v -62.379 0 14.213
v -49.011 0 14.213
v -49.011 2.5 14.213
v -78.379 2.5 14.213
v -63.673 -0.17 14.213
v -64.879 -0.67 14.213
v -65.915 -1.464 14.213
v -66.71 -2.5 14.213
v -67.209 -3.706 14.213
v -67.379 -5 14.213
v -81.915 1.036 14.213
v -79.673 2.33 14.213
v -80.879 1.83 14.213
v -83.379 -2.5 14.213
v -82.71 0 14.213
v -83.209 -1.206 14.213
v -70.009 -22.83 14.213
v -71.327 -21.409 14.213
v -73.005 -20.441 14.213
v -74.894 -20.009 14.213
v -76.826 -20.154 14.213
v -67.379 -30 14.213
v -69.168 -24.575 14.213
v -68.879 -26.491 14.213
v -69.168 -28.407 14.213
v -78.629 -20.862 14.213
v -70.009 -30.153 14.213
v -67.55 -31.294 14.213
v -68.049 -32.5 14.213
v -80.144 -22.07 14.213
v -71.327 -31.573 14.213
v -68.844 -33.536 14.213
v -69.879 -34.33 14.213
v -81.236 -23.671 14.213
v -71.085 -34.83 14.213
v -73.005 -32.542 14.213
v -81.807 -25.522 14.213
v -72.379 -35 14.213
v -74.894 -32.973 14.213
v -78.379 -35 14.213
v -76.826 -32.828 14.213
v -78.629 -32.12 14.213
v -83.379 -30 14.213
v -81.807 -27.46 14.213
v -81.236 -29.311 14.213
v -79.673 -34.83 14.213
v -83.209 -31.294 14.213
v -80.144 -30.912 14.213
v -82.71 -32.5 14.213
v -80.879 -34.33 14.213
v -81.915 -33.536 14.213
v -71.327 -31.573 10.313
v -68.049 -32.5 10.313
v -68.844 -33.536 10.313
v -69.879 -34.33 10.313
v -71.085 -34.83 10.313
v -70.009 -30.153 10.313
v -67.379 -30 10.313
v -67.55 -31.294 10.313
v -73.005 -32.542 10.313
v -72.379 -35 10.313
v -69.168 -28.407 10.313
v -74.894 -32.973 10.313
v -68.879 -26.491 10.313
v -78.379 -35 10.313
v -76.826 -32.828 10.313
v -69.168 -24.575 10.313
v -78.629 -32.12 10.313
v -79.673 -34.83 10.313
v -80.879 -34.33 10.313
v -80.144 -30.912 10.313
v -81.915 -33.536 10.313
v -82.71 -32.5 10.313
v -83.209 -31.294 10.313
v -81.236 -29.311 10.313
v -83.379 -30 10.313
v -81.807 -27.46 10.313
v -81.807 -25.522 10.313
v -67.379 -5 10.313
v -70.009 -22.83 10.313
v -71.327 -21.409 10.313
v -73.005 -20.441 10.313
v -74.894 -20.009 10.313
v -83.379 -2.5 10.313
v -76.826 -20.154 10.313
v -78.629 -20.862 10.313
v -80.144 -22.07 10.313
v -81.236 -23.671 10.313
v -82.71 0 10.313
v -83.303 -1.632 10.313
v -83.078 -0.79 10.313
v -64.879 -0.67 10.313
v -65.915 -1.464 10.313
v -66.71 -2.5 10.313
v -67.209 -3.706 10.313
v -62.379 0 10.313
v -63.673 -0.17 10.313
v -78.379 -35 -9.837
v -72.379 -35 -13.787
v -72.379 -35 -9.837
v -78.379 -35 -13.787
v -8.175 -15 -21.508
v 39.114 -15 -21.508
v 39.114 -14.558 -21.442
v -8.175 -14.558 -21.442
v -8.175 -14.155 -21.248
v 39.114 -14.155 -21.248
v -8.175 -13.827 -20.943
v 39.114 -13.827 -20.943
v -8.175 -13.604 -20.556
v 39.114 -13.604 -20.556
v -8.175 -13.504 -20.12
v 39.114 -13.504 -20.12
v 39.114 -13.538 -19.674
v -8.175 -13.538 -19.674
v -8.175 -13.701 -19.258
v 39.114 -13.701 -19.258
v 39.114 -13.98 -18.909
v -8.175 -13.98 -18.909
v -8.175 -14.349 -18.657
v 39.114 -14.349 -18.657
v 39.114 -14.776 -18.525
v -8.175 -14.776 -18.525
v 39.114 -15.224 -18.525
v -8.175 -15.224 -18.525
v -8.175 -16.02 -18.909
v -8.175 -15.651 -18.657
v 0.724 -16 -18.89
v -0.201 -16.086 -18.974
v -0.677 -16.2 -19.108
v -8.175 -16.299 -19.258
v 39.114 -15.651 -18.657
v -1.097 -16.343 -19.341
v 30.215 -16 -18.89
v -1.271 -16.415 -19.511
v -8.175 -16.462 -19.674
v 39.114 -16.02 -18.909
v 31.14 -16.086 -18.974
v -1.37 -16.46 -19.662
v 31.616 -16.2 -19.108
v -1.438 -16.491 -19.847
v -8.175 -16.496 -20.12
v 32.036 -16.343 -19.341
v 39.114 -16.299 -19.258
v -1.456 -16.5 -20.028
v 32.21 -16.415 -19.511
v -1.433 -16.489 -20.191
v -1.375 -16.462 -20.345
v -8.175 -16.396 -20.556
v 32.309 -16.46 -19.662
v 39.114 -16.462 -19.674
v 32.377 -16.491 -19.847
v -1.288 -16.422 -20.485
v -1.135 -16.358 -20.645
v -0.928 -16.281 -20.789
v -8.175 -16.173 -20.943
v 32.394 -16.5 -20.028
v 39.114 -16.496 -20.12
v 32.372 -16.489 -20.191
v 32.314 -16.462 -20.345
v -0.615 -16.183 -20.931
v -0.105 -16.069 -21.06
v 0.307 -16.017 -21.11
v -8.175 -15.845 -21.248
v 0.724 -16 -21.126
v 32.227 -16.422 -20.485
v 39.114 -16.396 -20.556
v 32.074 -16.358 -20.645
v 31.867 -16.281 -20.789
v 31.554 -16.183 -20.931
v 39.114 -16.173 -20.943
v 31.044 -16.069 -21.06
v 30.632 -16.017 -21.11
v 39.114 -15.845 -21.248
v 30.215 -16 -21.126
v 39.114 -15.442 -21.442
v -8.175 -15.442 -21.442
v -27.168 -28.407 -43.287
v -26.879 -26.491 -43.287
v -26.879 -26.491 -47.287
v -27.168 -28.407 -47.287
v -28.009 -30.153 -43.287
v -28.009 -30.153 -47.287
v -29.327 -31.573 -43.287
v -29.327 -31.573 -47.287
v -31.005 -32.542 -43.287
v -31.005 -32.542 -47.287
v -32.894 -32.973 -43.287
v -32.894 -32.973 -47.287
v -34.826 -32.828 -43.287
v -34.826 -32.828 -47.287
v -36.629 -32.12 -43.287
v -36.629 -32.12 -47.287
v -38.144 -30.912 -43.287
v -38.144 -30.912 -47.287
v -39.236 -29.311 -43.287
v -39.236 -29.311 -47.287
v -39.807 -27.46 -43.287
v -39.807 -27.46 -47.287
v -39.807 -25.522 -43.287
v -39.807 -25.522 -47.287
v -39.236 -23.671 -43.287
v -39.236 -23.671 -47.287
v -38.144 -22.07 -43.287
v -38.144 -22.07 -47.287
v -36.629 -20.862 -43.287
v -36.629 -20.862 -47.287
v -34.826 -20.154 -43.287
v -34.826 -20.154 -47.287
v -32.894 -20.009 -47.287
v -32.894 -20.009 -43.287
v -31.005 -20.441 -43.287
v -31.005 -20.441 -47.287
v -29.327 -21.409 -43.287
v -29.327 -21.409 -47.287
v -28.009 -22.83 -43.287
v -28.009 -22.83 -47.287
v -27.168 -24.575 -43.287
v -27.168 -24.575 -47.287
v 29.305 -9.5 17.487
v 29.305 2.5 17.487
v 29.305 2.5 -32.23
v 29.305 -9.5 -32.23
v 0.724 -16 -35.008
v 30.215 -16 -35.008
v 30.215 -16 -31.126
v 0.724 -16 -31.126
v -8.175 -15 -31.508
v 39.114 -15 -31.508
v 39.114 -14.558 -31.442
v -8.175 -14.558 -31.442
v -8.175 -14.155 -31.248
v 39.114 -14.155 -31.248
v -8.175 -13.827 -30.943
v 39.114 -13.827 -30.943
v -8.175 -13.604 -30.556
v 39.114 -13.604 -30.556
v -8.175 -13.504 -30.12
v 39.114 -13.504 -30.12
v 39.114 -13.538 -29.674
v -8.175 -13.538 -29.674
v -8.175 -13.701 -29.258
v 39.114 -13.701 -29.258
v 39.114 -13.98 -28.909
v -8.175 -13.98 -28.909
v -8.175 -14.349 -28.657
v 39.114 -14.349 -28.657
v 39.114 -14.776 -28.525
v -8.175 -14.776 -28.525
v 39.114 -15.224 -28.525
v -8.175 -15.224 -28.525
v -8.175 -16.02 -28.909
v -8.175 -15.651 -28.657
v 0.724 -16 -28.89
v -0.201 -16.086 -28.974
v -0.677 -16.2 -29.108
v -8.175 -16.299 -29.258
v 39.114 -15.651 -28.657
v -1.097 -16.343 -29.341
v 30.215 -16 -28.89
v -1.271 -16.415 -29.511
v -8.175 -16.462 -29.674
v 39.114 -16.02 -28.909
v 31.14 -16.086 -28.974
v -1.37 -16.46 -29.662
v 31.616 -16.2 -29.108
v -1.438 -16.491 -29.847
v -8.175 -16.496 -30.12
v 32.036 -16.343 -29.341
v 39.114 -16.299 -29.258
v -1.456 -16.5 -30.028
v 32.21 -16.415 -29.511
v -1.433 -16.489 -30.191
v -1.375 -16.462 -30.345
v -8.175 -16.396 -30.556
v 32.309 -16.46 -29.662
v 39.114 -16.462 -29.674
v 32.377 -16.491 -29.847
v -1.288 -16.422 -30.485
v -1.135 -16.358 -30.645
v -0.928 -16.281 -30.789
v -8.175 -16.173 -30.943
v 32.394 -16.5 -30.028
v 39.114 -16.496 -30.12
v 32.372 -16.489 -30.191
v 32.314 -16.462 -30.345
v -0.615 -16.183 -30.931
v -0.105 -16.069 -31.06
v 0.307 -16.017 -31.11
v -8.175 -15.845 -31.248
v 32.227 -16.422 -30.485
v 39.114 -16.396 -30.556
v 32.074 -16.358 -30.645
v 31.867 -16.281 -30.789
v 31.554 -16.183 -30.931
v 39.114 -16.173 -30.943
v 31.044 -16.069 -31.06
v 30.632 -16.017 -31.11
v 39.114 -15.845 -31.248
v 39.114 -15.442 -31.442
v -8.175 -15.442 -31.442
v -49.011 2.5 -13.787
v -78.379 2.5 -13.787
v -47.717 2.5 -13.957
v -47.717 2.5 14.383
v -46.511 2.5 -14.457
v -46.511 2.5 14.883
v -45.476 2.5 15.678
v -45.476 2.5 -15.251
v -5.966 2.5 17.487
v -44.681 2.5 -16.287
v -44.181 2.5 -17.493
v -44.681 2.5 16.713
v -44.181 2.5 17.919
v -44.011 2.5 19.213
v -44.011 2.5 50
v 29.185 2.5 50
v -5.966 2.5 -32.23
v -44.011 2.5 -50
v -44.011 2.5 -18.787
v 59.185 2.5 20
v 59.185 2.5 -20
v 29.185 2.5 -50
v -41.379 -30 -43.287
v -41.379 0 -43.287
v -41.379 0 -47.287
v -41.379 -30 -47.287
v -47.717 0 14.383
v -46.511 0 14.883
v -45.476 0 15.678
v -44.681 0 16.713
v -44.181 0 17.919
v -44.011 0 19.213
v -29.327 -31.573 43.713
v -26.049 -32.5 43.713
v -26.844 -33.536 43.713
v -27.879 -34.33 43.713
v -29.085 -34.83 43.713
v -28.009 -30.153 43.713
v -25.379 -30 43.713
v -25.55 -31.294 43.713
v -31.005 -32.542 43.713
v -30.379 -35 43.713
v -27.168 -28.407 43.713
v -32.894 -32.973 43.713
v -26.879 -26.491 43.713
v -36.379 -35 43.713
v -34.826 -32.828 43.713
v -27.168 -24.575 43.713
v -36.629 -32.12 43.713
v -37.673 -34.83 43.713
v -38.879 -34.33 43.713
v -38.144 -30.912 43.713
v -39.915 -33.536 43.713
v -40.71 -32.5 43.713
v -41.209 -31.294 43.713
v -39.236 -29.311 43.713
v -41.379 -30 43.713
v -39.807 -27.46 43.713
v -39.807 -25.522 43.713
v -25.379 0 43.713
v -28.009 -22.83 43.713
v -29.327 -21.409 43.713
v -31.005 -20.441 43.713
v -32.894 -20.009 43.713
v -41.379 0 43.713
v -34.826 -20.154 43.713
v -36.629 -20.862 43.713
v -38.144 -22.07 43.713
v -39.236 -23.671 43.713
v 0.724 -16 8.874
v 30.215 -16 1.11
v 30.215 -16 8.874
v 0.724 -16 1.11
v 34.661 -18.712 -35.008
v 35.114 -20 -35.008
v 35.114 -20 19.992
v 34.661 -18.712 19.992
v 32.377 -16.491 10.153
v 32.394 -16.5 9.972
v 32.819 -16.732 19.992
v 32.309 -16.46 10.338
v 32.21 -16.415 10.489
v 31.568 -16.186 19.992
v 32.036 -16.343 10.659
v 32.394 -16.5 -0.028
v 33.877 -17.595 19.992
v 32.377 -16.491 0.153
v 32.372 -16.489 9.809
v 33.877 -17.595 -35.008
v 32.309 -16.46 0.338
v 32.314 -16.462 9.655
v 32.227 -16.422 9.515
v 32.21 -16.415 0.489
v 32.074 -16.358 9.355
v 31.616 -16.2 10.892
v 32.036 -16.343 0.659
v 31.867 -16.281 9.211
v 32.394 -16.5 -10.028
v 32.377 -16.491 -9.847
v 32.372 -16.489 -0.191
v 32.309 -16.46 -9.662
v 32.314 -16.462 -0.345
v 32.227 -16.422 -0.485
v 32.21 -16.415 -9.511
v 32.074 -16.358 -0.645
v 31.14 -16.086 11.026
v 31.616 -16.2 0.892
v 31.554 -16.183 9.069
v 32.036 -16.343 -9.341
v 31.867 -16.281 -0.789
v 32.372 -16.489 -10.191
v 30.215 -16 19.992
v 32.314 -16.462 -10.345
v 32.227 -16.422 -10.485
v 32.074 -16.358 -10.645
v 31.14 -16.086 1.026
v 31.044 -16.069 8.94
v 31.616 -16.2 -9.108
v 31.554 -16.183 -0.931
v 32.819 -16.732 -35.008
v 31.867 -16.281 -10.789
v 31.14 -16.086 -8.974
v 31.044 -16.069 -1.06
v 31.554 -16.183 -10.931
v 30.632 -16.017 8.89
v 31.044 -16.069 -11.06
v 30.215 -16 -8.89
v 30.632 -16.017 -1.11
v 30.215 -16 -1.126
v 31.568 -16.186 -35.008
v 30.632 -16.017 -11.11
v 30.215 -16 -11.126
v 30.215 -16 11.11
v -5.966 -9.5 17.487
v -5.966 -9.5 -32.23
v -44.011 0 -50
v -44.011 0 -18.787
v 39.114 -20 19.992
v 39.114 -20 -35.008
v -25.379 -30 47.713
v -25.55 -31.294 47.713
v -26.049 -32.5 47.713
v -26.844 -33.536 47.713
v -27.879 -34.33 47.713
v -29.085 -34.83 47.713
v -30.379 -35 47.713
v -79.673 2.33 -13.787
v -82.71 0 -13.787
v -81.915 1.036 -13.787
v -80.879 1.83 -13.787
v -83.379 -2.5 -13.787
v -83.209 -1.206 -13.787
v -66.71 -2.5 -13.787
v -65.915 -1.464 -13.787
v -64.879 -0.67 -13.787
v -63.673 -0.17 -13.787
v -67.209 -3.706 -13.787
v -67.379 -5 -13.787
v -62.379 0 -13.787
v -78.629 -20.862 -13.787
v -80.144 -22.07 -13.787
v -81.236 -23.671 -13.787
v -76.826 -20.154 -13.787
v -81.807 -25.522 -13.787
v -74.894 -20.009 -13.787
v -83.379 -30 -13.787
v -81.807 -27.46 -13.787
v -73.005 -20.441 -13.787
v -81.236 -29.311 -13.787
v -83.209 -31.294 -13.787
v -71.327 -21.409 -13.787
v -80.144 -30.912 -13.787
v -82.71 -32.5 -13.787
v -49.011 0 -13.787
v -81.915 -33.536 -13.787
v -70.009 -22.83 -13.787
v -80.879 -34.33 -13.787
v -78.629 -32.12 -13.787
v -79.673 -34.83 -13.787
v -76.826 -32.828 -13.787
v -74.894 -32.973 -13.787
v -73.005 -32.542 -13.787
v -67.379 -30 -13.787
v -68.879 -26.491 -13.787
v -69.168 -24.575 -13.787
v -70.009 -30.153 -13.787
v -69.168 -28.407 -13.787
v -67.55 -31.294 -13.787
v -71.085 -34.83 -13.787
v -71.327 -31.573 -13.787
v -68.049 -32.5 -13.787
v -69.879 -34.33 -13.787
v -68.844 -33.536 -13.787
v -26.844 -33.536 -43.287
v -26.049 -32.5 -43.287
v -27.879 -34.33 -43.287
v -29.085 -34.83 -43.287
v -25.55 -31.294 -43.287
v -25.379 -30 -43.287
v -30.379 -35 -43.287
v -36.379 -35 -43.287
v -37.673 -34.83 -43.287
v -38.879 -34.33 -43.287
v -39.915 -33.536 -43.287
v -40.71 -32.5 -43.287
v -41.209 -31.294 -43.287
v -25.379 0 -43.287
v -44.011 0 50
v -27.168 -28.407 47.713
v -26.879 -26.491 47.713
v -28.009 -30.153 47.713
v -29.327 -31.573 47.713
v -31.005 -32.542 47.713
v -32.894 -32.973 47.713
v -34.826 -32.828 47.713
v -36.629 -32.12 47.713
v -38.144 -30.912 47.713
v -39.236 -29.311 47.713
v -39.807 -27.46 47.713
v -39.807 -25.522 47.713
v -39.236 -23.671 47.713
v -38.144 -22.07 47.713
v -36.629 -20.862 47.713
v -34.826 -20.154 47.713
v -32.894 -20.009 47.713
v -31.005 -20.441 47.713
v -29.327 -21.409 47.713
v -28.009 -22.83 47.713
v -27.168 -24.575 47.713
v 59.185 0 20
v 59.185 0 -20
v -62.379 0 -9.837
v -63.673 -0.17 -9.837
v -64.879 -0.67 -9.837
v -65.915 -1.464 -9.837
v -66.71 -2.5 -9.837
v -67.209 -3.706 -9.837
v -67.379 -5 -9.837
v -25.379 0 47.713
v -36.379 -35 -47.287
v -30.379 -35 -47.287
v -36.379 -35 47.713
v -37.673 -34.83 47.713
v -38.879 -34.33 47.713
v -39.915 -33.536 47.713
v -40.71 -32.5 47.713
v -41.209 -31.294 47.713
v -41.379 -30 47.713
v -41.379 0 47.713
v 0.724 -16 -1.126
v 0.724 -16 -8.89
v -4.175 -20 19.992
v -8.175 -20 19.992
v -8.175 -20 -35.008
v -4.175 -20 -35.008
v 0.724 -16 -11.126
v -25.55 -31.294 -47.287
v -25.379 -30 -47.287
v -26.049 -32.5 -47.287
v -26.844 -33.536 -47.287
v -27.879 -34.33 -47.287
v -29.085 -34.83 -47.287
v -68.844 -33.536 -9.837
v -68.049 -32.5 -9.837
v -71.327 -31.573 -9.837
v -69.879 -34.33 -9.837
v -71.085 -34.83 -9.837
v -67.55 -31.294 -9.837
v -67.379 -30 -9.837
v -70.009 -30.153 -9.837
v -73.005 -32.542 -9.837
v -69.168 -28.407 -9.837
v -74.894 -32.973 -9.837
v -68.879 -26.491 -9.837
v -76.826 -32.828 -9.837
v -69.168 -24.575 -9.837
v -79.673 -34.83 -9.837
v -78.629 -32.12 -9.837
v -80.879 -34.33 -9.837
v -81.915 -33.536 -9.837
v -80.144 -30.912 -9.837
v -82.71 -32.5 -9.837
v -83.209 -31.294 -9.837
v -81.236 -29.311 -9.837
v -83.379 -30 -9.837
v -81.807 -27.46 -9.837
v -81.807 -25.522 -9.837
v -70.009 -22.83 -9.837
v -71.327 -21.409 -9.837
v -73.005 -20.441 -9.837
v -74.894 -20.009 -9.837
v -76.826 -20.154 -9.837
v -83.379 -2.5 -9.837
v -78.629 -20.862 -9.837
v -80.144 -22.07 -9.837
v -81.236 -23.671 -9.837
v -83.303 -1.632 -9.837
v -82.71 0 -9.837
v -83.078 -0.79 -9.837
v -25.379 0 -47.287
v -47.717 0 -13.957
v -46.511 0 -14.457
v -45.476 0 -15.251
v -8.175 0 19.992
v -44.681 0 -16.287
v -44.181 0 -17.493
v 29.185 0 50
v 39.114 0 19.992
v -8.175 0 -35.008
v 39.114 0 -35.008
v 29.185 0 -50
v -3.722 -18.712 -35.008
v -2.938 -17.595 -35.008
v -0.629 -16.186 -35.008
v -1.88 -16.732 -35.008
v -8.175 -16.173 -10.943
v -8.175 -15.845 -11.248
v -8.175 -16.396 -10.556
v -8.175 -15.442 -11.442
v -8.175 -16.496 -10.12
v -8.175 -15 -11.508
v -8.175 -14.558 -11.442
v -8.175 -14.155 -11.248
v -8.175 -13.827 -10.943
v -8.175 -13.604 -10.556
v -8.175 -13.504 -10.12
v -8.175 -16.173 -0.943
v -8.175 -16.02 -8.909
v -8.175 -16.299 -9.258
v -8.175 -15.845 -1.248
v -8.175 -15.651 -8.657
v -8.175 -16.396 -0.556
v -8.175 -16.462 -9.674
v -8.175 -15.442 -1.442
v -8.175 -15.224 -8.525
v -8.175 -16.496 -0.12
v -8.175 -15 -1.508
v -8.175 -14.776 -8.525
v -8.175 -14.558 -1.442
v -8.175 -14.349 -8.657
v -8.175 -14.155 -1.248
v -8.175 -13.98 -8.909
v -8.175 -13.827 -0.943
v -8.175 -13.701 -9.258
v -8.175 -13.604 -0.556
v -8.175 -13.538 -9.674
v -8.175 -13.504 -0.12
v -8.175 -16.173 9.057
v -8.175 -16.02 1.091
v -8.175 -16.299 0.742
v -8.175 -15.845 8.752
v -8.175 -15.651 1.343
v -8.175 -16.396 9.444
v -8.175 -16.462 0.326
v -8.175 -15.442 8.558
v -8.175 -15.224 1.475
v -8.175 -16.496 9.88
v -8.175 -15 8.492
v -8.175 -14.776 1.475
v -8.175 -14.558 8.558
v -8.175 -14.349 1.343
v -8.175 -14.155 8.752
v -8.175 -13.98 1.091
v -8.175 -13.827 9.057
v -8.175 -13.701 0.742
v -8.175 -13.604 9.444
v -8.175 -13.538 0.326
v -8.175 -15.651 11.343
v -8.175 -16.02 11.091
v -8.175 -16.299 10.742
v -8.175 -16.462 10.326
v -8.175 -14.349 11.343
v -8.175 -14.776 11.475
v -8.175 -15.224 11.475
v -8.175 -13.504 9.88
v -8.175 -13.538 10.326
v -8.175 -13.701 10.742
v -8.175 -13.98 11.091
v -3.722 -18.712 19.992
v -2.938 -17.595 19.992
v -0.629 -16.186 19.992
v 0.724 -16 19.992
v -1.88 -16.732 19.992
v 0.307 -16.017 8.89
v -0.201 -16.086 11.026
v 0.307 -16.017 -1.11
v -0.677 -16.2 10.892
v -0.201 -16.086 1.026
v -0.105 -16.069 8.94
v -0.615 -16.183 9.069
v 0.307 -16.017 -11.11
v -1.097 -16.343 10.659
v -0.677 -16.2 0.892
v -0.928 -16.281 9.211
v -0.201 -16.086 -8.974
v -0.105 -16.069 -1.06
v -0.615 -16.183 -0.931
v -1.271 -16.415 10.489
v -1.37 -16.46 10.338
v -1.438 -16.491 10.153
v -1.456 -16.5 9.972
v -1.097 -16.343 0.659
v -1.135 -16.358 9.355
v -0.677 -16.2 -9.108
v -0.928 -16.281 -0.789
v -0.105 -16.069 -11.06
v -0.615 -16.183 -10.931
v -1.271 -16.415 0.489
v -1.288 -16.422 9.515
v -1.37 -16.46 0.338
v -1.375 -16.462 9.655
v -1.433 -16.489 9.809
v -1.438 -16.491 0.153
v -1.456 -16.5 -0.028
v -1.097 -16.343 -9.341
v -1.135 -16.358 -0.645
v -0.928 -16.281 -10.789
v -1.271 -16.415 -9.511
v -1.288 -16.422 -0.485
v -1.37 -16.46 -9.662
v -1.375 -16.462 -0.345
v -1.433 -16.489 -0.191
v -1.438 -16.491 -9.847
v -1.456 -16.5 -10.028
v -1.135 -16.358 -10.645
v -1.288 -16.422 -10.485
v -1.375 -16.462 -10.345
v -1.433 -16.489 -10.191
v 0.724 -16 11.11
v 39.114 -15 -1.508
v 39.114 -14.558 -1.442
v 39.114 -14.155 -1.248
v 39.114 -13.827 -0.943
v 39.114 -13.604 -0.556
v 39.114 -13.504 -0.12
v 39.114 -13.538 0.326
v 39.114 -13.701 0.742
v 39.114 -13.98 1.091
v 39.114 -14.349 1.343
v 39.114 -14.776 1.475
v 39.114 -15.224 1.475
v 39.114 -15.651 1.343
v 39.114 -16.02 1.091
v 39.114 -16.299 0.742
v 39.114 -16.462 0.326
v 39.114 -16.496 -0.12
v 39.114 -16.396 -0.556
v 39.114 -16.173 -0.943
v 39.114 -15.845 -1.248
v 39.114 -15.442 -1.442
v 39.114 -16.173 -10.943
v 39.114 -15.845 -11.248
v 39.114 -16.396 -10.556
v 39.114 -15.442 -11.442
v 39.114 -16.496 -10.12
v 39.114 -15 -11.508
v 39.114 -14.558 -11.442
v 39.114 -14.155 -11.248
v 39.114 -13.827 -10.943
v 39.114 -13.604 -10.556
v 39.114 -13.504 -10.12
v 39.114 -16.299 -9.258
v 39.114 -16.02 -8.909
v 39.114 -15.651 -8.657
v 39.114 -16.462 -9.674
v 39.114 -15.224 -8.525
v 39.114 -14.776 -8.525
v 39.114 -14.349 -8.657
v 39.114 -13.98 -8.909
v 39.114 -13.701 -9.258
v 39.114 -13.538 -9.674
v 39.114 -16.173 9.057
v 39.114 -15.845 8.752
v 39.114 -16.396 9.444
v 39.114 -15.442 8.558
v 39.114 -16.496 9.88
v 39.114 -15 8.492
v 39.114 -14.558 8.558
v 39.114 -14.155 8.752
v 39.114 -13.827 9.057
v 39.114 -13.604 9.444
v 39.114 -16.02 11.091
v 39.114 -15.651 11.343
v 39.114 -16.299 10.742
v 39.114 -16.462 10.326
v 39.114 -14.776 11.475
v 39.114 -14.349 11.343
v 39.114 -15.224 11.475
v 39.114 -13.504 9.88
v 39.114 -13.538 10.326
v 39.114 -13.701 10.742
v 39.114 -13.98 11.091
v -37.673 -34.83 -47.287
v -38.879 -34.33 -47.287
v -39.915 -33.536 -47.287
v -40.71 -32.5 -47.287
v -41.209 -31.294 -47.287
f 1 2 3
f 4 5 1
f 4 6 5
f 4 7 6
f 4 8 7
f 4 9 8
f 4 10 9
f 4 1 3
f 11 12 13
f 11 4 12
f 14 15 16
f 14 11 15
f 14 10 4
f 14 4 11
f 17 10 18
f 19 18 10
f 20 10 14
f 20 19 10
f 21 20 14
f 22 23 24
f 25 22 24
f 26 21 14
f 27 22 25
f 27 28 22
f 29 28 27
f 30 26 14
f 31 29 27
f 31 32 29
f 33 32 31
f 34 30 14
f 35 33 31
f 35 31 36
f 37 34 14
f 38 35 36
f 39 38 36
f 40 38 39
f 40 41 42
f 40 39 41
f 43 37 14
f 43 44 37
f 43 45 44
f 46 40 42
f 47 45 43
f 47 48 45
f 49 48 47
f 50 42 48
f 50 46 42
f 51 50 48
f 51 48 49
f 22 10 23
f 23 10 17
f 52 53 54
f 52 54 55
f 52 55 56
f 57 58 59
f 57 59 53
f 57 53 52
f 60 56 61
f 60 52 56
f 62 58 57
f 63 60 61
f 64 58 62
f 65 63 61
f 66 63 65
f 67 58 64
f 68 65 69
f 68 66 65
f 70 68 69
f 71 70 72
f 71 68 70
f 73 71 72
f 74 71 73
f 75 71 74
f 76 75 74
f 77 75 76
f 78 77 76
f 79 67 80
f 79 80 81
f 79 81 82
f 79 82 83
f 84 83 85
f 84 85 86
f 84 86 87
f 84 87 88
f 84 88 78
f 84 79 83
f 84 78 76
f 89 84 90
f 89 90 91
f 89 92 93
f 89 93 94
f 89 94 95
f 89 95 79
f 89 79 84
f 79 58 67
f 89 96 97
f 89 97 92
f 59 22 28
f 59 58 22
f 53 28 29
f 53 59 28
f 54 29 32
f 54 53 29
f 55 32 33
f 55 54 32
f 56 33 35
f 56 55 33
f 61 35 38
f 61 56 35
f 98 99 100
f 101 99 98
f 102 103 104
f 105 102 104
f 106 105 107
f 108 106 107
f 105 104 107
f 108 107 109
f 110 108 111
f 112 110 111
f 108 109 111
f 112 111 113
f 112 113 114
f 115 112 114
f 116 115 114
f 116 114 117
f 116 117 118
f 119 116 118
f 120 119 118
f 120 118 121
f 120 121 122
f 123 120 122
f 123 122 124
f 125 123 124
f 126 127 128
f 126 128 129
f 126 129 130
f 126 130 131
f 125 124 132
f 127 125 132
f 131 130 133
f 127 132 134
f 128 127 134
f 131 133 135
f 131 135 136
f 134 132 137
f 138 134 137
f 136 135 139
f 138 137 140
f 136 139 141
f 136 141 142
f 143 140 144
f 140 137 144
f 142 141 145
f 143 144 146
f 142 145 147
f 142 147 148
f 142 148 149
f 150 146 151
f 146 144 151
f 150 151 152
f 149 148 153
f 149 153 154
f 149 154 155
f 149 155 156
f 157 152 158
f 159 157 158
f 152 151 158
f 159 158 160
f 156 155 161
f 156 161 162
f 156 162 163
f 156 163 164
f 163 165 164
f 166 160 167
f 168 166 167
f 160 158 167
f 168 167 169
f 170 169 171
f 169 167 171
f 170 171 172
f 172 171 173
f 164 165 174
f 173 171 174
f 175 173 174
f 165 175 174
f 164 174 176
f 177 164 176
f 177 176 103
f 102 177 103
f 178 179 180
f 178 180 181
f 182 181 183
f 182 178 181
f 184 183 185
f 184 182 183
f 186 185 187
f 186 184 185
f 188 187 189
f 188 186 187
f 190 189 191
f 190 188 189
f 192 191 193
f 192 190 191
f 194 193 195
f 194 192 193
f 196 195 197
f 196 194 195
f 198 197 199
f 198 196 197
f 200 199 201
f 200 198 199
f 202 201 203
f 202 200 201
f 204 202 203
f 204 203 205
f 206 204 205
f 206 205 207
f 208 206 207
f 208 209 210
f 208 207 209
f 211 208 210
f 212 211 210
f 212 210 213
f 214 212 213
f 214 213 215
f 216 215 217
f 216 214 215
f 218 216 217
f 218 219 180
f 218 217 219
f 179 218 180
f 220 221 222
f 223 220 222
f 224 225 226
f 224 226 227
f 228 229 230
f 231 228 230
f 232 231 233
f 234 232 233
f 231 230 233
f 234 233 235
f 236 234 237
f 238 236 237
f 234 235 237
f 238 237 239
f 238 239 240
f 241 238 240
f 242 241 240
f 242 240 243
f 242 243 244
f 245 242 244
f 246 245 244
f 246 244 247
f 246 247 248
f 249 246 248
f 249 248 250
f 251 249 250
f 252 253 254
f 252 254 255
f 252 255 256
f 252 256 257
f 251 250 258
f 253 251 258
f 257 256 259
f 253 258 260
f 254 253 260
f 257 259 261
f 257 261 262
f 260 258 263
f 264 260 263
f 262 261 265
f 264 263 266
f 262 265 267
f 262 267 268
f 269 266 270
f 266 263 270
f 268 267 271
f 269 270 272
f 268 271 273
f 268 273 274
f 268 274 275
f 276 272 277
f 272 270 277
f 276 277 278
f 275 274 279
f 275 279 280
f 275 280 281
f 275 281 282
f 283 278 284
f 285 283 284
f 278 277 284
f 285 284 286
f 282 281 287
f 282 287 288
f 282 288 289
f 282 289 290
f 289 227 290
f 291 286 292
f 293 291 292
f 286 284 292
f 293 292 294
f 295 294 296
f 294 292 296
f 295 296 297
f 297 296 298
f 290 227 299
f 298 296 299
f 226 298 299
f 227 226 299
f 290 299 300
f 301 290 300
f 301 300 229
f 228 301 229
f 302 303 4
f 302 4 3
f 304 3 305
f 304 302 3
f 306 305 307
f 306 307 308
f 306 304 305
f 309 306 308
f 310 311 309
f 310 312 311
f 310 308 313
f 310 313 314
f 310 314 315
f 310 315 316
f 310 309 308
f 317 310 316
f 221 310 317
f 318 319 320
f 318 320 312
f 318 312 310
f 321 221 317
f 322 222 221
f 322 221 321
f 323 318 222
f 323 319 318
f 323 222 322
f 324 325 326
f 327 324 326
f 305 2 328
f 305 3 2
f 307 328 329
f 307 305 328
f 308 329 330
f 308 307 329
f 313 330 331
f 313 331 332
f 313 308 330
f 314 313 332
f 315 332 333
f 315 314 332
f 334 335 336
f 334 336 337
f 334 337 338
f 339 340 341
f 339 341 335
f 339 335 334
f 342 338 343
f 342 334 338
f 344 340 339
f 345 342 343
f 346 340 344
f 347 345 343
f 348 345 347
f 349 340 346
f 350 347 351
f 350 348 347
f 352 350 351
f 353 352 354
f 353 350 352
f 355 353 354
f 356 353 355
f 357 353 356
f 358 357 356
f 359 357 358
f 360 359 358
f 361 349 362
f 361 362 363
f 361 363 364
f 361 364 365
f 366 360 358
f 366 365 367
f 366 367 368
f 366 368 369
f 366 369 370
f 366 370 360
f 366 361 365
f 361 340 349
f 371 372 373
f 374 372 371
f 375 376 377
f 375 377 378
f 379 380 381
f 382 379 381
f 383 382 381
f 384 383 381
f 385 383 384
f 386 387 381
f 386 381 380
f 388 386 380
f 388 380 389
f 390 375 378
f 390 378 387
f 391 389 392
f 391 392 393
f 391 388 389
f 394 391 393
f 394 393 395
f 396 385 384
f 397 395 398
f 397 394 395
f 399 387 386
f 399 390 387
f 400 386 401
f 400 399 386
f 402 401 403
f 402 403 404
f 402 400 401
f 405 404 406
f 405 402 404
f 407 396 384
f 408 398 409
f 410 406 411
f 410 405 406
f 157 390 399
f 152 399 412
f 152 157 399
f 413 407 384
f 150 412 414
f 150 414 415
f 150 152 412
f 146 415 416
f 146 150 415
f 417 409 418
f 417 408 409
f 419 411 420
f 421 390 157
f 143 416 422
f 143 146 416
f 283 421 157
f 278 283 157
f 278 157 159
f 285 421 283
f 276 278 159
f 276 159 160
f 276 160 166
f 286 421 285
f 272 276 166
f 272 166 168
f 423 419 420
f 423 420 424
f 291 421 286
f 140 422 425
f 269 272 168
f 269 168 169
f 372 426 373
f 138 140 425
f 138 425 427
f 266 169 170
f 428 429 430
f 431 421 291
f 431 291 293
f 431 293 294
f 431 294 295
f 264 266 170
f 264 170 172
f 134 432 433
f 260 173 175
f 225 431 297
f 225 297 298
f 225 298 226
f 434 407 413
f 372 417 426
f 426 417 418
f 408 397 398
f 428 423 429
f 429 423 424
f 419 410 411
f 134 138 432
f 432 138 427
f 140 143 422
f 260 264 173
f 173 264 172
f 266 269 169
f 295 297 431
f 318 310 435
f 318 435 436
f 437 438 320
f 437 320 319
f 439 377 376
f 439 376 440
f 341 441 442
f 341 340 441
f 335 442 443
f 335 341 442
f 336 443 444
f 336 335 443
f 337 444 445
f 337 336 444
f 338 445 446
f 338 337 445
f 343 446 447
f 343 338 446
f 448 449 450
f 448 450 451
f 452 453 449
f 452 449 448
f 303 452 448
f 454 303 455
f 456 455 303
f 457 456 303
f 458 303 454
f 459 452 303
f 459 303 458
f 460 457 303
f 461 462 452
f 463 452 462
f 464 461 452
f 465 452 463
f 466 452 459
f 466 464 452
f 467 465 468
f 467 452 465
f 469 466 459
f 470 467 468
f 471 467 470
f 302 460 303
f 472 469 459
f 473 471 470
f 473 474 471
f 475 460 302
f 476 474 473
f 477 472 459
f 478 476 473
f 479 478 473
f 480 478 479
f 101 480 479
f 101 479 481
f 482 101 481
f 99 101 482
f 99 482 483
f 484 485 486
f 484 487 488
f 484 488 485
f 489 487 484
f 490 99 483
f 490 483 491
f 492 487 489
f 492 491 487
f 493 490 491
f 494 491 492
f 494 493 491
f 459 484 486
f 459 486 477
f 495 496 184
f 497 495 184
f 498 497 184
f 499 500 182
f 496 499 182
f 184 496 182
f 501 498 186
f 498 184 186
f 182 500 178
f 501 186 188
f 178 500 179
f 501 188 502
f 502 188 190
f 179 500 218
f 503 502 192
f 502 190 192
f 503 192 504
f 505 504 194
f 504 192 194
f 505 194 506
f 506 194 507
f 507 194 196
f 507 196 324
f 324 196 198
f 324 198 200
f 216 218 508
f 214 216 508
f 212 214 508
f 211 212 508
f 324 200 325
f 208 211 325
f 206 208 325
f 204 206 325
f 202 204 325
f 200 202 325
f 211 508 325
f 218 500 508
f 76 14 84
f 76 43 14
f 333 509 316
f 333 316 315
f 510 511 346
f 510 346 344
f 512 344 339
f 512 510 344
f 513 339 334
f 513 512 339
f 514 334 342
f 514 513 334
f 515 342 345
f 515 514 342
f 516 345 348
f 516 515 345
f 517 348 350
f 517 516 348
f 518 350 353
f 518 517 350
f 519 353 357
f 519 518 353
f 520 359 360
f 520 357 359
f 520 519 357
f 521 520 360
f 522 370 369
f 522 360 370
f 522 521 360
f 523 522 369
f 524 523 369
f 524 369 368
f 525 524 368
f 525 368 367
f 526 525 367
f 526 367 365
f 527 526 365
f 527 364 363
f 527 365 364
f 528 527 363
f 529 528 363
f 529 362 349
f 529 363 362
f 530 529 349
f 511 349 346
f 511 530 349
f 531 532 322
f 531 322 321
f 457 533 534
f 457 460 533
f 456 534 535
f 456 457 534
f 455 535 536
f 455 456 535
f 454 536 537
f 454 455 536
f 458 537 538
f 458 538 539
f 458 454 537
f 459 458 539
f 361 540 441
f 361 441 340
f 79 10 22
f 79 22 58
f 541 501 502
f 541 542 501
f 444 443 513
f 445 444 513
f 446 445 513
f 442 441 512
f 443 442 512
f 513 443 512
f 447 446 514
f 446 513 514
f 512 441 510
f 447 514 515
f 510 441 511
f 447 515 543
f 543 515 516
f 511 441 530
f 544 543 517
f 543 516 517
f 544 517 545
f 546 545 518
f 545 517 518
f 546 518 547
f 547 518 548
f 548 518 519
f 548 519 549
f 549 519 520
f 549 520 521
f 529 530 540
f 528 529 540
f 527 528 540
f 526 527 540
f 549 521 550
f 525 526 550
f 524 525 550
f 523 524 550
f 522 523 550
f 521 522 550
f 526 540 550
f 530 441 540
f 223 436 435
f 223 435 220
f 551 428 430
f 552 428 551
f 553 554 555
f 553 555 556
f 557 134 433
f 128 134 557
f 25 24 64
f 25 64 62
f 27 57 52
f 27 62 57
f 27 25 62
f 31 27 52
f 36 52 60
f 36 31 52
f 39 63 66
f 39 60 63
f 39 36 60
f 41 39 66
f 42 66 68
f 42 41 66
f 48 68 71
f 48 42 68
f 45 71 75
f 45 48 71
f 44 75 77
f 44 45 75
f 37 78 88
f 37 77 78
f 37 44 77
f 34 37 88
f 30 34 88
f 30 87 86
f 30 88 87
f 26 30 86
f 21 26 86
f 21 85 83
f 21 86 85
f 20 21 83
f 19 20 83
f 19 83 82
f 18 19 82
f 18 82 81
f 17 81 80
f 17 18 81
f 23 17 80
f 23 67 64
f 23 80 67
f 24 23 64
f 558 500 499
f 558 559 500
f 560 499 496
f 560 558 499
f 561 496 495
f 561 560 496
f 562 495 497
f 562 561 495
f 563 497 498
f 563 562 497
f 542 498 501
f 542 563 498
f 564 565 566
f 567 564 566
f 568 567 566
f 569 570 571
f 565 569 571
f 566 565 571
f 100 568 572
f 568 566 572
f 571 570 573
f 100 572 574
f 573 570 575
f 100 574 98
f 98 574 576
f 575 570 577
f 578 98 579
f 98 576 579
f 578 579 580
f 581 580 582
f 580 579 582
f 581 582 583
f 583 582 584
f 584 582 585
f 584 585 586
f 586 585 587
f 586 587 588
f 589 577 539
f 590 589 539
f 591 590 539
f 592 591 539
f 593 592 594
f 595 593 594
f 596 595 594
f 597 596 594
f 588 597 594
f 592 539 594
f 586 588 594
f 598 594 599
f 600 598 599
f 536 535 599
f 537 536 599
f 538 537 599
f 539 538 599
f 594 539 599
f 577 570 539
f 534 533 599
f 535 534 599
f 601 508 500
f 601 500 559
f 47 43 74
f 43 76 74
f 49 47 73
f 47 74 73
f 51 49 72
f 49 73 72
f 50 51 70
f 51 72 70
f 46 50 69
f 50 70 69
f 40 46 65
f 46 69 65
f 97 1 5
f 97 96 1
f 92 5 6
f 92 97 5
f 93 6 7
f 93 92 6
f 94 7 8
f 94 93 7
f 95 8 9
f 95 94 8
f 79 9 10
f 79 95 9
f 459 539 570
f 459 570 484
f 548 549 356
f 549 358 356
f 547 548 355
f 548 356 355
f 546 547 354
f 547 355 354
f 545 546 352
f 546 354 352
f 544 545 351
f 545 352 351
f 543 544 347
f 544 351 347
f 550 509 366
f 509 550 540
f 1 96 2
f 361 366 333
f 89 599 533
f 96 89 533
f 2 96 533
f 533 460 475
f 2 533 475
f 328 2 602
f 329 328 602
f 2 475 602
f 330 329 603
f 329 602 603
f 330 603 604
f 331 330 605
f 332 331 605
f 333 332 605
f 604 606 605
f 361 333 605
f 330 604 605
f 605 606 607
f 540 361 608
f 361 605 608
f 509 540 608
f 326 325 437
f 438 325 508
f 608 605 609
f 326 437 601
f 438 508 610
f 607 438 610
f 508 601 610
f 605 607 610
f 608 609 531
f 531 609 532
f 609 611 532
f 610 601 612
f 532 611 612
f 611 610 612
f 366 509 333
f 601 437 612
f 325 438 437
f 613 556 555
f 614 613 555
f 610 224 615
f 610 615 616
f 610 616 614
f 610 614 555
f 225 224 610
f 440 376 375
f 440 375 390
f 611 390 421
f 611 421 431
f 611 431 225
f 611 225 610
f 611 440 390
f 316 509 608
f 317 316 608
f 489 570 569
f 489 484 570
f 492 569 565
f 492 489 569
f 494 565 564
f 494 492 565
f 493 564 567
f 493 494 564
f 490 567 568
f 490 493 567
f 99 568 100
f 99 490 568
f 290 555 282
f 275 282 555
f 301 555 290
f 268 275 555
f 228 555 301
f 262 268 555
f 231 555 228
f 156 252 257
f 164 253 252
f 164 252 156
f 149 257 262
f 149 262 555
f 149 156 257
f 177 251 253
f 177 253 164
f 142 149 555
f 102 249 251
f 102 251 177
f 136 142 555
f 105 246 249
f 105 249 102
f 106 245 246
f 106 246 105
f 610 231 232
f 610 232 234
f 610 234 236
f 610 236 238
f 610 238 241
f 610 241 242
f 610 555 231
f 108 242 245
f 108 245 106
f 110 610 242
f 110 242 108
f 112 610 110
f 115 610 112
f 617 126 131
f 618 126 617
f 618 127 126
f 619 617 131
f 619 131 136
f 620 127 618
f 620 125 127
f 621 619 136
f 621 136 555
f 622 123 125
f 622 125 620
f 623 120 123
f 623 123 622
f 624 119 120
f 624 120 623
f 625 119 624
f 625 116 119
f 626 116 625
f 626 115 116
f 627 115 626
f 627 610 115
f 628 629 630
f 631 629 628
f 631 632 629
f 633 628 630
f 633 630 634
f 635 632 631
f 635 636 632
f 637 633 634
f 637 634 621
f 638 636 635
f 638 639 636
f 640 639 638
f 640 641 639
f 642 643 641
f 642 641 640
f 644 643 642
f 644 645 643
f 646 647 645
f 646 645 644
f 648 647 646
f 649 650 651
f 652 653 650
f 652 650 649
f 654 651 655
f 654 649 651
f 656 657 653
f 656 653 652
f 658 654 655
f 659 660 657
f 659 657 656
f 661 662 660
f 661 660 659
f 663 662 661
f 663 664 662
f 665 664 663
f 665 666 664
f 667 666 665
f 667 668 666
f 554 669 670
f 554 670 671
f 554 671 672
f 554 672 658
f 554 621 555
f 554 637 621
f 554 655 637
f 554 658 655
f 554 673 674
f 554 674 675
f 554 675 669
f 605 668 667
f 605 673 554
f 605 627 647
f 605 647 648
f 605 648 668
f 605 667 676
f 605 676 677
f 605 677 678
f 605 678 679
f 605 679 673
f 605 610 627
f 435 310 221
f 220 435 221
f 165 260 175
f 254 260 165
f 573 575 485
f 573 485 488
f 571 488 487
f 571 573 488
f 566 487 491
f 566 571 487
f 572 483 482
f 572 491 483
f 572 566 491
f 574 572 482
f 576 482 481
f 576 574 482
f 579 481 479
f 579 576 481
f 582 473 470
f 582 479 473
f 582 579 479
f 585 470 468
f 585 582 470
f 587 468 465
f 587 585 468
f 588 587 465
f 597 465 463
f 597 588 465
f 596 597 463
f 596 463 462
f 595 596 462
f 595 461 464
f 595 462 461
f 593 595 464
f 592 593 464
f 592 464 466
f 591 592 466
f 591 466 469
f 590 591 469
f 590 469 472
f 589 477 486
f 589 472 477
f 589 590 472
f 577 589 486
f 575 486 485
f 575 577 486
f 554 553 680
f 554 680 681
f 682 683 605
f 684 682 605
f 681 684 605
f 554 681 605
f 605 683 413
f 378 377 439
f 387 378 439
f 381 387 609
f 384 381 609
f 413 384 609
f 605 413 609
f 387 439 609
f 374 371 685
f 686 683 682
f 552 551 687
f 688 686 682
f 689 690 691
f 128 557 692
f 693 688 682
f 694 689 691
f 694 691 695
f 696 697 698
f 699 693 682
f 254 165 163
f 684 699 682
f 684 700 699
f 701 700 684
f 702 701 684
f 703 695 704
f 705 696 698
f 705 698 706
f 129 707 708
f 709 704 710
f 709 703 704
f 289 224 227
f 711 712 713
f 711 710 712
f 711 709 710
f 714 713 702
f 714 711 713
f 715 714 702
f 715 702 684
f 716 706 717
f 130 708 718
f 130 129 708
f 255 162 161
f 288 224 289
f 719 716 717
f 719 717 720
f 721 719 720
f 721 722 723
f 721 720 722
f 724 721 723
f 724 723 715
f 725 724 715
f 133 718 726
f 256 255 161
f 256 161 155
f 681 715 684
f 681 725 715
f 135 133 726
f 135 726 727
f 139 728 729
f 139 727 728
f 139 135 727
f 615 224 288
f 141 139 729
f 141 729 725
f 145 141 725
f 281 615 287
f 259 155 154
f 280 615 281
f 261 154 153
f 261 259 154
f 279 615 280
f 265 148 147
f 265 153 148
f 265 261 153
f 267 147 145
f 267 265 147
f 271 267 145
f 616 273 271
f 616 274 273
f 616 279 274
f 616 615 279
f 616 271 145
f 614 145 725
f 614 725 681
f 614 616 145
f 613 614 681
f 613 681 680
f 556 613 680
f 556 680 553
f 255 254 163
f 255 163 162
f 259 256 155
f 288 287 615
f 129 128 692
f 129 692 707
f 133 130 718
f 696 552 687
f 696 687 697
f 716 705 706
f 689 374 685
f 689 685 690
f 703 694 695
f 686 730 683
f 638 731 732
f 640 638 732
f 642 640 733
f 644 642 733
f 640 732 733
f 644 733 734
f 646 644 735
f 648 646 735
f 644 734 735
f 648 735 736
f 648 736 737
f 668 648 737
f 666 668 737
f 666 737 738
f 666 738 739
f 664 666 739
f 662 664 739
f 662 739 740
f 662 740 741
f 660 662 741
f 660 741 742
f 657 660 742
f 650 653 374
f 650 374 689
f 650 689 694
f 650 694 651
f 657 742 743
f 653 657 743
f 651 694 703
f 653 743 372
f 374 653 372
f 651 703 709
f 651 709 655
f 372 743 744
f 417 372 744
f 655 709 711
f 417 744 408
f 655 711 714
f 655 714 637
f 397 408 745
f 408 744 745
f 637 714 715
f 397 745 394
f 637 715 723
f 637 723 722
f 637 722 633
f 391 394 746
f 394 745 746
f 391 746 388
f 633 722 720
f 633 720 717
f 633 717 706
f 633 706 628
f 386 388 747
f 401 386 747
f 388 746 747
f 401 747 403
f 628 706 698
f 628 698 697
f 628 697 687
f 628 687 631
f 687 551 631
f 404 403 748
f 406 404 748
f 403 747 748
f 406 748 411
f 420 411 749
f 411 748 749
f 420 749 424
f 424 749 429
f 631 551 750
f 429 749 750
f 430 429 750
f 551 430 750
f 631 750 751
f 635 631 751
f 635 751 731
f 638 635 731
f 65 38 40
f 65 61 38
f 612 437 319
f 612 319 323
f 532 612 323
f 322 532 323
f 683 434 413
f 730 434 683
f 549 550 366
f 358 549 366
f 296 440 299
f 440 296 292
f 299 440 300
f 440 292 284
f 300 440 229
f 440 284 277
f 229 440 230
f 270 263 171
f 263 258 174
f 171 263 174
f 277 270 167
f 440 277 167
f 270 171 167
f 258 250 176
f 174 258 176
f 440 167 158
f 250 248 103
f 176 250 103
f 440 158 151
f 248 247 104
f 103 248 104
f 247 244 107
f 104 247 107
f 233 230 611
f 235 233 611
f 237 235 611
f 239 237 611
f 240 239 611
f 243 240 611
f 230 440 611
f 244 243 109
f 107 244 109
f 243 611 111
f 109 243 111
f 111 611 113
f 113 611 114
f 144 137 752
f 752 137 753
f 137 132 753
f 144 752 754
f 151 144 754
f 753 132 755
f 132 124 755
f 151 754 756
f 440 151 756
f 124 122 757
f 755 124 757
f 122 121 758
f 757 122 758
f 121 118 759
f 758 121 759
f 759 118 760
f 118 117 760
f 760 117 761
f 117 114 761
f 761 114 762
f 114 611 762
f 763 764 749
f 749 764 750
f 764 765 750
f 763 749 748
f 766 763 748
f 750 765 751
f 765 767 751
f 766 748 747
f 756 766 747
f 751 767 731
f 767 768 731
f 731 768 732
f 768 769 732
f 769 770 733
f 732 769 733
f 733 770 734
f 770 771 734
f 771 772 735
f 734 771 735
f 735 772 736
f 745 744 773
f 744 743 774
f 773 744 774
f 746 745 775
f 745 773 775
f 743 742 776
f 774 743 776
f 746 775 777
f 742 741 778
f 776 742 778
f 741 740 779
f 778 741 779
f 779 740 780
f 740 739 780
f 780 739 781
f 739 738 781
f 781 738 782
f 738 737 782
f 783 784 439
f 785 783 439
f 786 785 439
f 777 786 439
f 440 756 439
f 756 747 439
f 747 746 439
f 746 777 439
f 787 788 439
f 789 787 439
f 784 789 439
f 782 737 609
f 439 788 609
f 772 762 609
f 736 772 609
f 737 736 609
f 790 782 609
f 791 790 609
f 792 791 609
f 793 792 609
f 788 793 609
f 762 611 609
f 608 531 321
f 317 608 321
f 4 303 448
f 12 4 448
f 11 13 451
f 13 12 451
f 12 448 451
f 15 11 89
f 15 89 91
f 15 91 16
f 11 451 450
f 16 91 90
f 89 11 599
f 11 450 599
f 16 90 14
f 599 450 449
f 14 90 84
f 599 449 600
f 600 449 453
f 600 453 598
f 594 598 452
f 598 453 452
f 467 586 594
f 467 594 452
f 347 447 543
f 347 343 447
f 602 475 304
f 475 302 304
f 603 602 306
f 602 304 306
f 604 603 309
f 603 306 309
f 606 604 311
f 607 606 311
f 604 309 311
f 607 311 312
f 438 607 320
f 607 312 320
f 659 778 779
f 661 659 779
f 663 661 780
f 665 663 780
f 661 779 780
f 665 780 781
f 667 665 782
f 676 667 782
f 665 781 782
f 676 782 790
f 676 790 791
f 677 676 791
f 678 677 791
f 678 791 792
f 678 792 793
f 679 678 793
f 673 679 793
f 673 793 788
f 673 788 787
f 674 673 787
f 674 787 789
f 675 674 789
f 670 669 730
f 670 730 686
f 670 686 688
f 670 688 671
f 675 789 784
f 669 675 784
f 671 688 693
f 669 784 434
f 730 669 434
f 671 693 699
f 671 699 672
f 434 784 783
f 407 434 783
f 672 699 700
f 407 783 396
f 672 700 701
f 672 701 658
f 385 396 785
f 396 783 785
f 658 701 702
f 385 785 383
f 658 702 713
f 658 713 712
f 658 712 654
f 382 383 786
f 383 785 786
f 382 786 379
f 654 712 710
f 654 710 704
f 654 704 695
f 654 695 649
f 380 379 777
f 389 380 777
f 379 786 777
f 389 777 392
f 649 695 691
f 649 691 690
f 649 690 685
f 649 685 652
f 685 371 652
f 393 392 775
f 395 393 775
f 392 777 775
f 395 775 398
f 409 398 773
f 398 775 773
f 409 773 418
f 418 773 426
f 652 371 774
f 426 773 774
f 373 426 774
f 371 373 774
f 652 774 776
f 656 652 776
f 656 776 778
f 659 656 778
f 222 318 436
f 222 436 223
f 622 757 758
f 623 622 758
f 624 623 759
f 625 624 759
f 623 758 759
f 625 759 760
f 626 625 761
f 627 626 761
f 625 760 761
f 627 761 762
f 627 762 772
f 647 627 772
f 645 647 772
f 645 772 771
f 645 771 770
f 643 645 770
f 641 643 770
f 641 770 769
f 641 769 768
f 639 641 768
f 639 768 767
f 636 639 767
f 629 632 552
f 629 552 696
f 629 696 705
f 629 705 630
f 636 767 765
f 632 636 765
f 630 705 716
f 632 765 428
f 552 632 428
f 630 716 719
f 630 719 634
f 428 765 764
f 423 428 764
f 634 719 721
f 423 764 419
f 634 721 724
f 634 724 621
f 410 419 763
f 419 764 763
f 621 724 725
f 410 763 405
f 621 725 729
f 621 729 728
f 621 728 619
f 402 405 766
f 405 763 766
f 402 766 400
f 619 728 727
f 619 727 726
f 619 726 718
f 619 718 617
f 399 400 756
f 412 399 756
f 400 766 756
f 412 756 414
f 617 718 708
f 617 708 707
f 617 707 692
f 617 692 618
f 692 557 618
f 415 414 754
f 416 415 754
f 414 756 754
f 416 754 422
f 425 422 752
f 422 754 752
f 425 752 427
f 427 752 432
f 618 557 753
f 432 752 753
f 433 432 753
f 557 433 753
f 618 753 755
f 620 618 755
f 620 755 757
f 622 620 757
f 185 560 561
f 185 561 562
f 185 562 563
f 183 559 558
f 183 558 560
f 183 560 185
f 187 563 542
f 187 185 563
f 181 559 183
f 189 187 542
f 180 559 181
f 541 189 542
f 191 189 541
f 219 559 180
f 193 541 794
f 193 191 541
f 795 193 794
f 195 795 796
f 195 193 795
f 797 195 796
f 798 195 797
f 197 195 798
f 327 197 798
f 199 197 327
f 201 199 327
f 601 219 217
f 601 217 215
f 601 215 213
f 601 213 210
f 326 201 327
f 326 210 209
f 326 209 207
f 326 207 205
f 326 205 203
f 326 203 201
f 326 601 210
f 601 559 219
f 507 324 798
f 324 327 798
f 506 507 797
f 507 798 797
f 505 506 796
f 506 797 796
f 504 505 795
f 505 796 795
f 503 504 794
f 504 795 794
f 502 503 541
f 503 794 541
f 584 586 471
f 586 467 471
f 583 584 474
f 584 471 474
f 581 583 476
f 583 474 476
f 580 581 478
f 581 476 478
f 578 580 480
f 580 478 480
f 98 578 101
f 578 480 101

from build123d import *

# Parameters (mm, degrees)
SKETCH1_W               = 200
SKETCH1_H               = 100
BOSS_EXTRUDE1_DEPTH     = 2.5
SKETCH2_W               = 16
SKETCH2_H               = 3.950426225
SKETCH2_H_2             = 3.900095421
SKETCH2_H_3             = 4
BOSS_EXTRUDE2_DEPTH     = 35
CUT_EXTRUDE1_DEPTH      = 39
CUT_EXTRUDE1_DEPTH_BACK = 67
SKETCH3_R               = 6.5
CUT_EXTRUDE2_DEPTH      = 17
FILLET1_R               = 5
SKETCH5_W               = 40.815497855
SKETCH5_H               = 100
CUT_EXTRUDE3_DEPTH      = 17
FILLET2_R               = 5
CHAMFER1_SIZE           = 30
FILLET3_R               = 5
FILLET4_R               = 5
SKETCH6_W               = 47.289599934
SKETCH6_H               = 55
BOSS_EXTRUDE3_DEPTH     = 20
SKETCH7_W               = 39.289599934
SKETCH7_H               = 4
CUT_EXTRUDE4_DEPTH      = 63
FILLET5_R               = 5
SKETCH8_R               = 1.5
CUT_EXTRUDE5_DEPTH      = 63
SKETCH9_W               = 35.271425717
SKETCH9_H               = 49.717701143
CUT_EXTRUDE6_DEPTH      = 12


with BuildPart() as part:
    # Sketch1 → Boss-Extrude1 (new body)
    with BuildSketch(Plane(origin=(0, 0, 0), x_dir=(1, 0, 0), z_dir=(0, 1, 0))):
        Rectangle(SKETCH1_W, SKETCH1_H)
    extrude(amount=BOSS_EXTRUDE1_DEPTH)

    # Sketch2 → Boss-Extrude2 (add)
    with BuildSketch(Plane(origin=(0, 0, 0), x_dir=(-1, 0, 0), z_dir=(0, -1, 0))):
        with Locations((75.379396221, 11.811738969)):
            Rectangle(SKETCH2_W, SKETCH2_H)
        with Locations((75.379396221, -12.263000209)):
            Rectangle(SKETCH2_W, SKETCH2_H_2)
        with Locations((33.379396221, 45.286952081)):
            Rectangle(SKETCH2_W, SKETCH2_H_3)
        with Locations((33.379396221, -45.713047919)):
            Rectangle(SKETCH2_W, SKETCH2_H_3)
    extrude(amount=BOSS_EXTRUDE2_DEPTH)

    # Sketch3 → Cut-Extrude1 (cut, two sides: drawn at the far end of the back side and taken through both)
    with BuildSketch(Plane(origin=(0, 0, -13.786952081), x_dir=(-1, 0, 0), z_dir=(0, 0, -1)).offset(-CUT_EXTRUDE1_DEPTH_BACK)):
        with Locations(Location((33.379396221, -26.491201538, 0), (0, 0, 180))):
            Circle(SKETCH3_R)
        with Locations(Location((75.379396221, -26.491201538, 0), (0, 0, 180))):
            Circle(SKETCH3_R)
    extrude(amount=CUT_EXTRUDE1_DEPTH + CUT_EXTRUDE1_DEPTH_BACK, mode=Mode.SUBTRACT)

    # Sketch4 → Cut-Extrude2 (cut)
    with BuildSketch(Plane(origin=(0, 0, 0), x_dir=(-1, 0, 0), z_dir=(0, -1, 0))):
        Polygon((44.011079662, 50), (100, 50), (100, 13.786952081), (100, -14.213047919), (100, -50), (44.011079662, -50), (44.011079662, -14.213047919), (83.379396221, -14.213047919), (83.379396221, 13.786952081), (44.011079662, 13.786952081), align=None)
    extrude(amount=-CUT_EXTRUDE2_DEPTH, mode=Mode.SUBTRACT)

    # Fillet1
    fillet1_edges = [part.edges().sort_by_distance(p)[0] for p in [
        (-83.379396221, -35, -11.811738968),
        (-67.379396221, -35, -11.811738968),
        (-83.379396221, -35, 12.263000209),
        (-67.379396221, -35, 12.263000209),
        (-41.379396221, -35, -45.286952081),
        (-25.379396221, -35, -45.286952081),
        (-41.379396221, -35, 45.713047919),
        (-25.379396221, -35, 45.713047919),
    ]]
    fillet(fillet1_edges, radius=FILLET1_R)

    # Sketch5 → Cut-Extrude3 (cut)
    with BuildSketch(Plane.XZ):
        with Locations((79.592251073, 0)):
            Rectangle(SKETCH5_W, SKETCH5_H)
    extrude(amount=-CUT_EXTRUDE3_DEPTH, mode=Mode.SUBTRACT)

    # Fillet2
    fillet2_edges = [part.edges().sort_by_distance(p)[0] for p in [
        (-44.011079662, 1.25, -13.786952081),
        (-44.011079662, 1.25, 14.213047919),
    ]]
    fillet(fillet2_edges, radius=FILLET2_R)

    # Chamfer1
    chamfer1_edges = [part.edges().sort_by_distance(p)[0] for p in [
        (59.184502145, 1.25, -50),
        (59.184502145, 1.25, 50),
    ]]
    chamfer(chamfer1_edges, length=CHAMFER1_SIZE)

    # Fillet3
    # the kernel refuses this fillet: 5 mm, written as the material it takes off along each edge
    with BuildSketch(Plane(origin=(-83.379396221, 2.5, -26.286952081), x_dir=(1, 0, 0), z_dir=(0, 0, 1))) as fillet3_piece_1:
        with BuildLine():
            CenterArc((FILLET3_R, -FILLET3_R), FILLET3_R, 90, 90)
            Line((0, -FILLET3_R), (0, 0))
            Line((0, 0), (FILLET3_R, 0))
        make_face()
    extrude(amount=53, mode=Mode.SUBTRACT)

    # Fillet4
    fillet4_edges = [part.edges().sort_by_distance(p)[0] for p in [
        (-67.379396221, 0, -11.811738968),
        (-67.379396221, 0, 12.263000209),
    ]]
    fillet(fillet4_edges, radius=FILLET4_R)

    # Sketch6 → Boss-Extrude3 (add)
    with BuildSketch(Plane.XZ):
        with Locations((15.469477867, -7.508196086)):
            Rectangle(SKETCH6_W, SKETCH6_H)
    extrude(amount=BOSS_EXTRUDE3_DEPTH)

    # Sketch7 → Cut-Extrude4 (cut)
    with BuildSketch(Plane(origin=(0, 0, -35.008196086), x_dir=(-1, 0, 0), z_dir=(0, 0, -1))):
        with Locations((-15.469477867, -18)):
            Rectangle(SKETCH7_W, SKETCH7_H)
    extrude(amount=-CUT_EXTRUDE4_DEPTH, mode=Mode.SUBTRACT)

    # Fillet5
    # the kernel refuses this fillet: 5 mm, written as the material it adds along each edge
    with BuildSketch(Plane(origin=(-4.1753221, -16, -35.008196086), x_dir=(1, 0, 0), z_dir=(0, 0, 1))) as fillet5_piece_1:
        with BuildLine():
            CenterArc((4.898979486, -5), FILLET5_R, 90, 78.463040967)
            Line((0, -4), (-0.09797959, -3.98))
            ThreePointArc((-0.09797959, -3.98), (-0.1, -2), (-0.1, 0))
            Line((-0.1, 0), (0, 0.1))
            Line((0, 0.1), (4.898979486, 0.1))
            Line((4.898979486, 0.1), (4.898979486, 0))
        make_face()
    extrude(amount=55)
    with BuildSketch(Plane(origin=(35.114277834, -16, -35.008196086), x_dir=(-1.570299446029318e-12, -1.0, 0), z_dir=(0, 0, 1))) as fillet5_piece_2:
        with BuildLine():
            CenterArc((5, -4.898979486), FILLET5_R, 101.536959033, 78.463040967)
            Line((0, -4.898979486), (-0.1, -4.898979486))
            Line((-0.1, -4.898979486), (-0.1, 0))
            Line((-0.1, 0), (0, 0.1))
            ThreePointArc((0, 0.1), (2, 0.1), (3.98, 0.09797959))
            Line((3.98, 0.09797959), (4, 0))
        make_face()
    extrude(amount=55)

    # Sketch8 → Cut-Extrude5 (cut)
    with BuildSketch(Plane(origin=(39.114277834, 0, 0), x_dir=(0, 0, -1), z_dir=(1, 0, 0))):
        with Locations((-9.991803914, -15)):
            Circle(SKETCH8_R)
        with Locations((10.008196086, -15)):
            Circle(SKETCH8_R)
        with Locations((0.008196086, -15)):
            Circle(SKETCH8_R)
        with Locations((20.008196086, -15)):
            Circle(SKETCH8_R)
        with Locations((30.008196086, -15)):
            Circle(SKETCH8_R)
    extrude(amount=-CUT_EXTRUDE5_DEPTH, mode=Mode.SUBTRACT)

    # Sketch9 → Cut-Extrude6 (cut)
    with BuildSketch(Plane(origin=(0, 2.5, 0), x_dir=(1, 0, 0), z_dir=(0, 1, 0))):
        with Locations((11.669671686, 7.37138384)):
            Rectangle(SKETCH9_W, SKETCH9_H)
    extrude(amount=-CUT_EXTRUDE6_DEPTH, mode=Mode.SUBTRACT)


solid = part.part
